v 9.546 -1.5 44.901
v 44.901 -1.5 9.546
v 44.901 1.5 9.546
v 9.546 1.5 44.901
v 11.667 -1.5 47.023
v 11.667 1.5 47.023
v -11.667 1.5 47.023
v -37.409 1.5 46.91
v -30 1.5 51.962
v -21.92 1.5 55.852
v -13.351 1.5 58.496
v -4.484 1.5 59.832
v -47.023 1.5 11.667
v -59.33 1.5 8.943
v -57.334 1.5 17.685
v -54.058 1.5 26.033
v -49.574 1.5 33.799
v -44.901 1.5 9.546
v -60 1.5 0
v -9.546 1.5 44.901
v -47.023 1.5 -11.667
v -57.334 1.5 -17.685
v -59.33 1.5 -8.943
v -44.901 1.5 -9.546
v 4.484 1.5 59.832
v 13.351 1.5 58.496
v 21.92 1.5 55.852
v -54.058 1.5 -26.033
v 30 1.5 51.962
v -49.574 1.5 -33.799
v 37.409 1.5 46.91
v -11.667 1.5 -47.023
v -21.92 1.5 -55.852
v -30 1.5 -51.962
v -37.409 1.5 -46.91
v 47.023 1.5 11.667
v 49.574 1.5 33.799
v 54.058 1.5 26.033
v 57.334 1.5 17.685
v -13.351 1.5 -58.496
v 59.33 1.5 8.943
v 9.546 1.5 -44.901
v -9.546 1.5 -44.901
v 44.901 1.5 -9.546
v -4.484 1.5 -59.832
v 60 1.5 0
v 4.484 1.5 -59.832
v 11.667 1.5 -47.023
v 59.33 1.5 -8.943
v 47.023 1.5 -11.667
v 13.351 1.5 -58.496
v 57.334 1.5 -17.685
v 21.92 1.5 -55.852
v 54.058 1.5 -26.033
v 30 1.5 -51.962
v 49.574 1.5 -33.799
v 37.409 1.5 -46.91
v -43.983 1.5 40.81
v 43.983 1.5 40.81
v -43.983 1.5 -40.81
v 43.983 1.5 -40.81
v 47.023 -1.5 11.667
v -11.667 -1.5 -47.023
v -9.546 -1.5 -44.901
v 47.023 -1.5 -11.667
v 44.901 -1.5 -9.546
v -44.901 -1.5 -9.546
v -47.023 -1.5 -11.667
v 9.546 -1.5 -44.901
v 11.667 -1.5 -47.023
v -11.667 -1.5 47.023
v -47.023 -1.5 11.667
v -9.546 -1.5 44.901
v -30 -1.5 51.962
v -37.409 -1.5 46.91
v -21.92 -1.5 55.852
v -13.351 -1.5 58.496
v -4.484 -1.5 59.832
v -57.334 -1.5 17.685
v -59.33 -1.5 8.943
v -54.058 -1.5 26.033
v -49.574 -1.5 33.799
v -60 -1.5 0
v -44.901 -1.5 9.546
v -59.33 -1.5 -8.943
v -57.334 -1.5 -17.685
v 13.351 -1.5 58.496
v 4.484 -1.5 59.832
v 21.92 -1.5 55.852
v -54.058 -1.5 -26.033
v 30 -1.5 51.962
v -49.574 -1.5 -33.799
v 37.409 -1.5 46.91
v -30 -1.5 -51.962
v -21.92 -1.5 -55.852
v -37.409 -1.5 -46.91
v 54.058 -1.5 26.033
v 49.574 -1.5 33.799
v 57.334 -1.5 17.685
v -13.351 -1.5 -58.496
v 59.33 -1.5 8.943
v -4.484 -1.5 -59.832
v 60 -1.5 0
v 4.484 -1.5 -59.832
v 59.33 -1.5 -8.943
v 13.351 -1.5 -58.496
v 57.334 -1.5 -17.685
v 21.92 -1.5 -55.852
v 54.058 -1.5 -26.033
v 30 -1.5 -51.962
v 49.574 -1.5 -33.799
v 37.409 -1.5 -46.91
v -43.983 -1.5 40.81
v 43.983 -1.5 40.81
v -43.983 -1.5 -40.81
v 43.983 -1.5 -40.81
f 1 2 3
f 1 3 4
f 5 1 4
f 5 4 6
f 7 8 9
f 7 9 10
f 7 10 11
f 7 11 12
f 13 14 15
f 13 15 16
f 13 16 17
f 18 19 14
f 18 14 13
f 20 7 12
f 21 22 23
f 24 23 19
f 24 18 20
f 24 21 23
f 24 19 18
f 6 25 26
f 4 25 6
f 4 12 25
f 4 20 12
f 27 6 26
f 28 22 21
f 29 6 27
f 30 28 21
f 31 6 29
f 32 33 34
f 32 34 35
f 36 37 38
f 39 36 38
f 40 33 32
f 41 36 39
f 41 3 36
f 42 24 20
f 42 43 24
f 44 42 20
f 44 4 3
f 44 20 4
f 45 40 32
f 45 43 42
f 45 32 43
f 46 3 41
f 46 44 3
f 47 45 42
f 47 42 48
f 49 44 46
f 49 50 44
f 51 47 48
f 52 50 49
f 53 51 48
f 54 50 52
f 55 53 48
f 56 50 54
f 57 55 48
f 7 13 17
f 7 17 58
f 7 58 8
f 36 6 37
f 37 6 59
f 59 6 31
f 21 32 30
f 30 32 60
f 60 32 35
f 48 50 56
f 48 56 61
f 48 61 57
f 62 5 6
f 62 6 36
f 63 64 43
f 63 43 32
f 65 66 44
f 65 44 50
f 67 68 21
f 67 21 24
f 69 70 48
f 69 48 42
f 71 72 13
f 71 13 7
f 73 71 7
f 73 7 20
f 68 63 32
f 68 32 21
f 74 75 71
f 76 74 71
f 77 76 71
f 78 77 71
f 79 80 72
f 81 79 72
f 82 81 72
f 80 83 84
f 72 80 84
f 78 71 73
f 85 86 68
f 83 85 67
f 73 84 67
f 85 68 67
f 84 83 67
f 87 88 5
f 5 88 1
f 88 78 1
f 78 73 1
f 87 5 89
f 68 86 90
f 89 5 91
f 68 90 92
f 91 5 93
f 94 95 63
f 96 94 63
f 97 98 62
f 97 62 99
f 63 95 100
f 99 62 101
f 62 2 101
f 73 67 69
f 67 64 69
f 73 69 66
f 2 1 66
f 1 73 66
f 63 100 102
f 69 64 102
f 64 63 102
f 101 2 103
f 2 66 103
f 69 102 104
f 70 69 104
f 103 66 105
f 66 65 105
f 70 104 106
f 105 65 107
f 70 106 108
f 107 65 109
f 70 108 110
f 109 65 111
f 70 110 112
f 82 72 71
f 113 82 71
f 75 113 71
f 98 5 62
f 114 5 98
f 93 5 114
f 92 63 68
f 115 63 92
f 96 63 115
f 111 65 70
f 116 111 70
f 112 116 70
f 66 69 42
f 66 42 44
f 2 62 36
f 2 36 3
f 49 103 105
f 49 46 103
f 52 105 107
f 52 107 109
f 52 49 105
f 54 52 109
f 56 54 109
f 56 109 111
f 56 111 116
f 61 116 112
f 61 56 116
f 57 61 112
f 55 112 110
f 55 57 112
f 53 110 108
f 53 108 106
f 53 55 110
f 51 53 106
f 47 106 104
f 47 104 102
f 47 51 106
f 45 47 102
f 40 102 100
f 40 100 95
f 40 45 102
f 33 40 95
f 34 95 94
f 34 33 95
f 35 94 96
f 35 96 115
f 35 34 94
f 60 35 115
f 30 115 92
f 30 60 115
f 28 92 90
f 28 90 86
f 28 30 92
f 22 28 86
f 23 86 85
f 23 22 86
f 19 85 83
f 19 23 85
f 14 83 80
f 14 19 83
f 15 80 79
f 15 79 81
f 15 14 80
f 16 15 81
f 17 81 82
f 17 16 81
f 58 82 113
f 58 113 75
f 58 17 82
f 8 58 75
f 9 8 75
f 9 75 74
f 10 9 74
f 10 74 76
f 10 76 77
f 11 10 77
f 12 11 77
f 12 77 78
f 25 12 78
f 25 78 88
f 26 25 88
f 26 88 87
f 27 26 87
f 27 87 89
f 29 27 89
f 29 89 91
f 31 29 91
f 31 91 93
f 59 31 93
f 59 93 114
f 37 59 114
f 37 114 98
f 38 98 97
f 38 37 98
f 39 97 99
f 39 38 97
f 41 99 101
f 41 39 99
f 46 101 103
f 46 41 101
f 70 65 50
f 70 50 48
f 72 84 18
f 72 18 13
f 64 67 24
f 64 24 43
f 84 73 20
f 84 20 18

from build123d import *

# Parameters (mm, degrees)
SKETCH1_R           = 60
BOSS_EXTRUDE1_DEPTH = 1.5
CUT_EXTRUDE3_START  = -4
CUT_EXTRUDE3_DEPTH  = 5
CIRPATTERN1_COUNT   = 4


with BuildPart() as part:
    # Sketch1 → Boss-Extrude1 (new body, symmetric)
    with BuildSketch(Plane(origin=(0, 0, 0), x_dir=(1, 0, 0), z_dir=(0, 1, 0))):
        Circle(SKETCH1_R)
    extrude(amount=BOSS_EXTRUDE1_DEPTH, both=True)

    # Sketch4 → Cut-Extrude3 (cut)
    with BuildSketch(Plane(origin=(0, 1.5, 0), x_dir=(1, 0, 0), z_dir=(0, 1, 0)).offset(CUT_EXTRUDE3_START)):
        Polygon((9.545941546, 44.901280605), (44.901280605, 9.545941546), (47.022600949, 11.66726189), (11.66726189, 47.022600949), align=None)
    cut_extrude3 = extrude(amount=CUT_EXTRUDE3_DEPTH, mode=Mode.SUBTRACT)

    # CirPattern1: Cut-Extrude3 ×4 about axis
    cirpattern1_axis = Axis((0, 0, 0), (0, 1, 0))
    for i in range(1, CIRPATTERN1_COUNT):
        add(cut_extrude3.rotate(cirpattern1_axis, i * 360 / CIRPATTERN1_COUNT), mode=Mode.SUBTRACT)


solid = part.part
